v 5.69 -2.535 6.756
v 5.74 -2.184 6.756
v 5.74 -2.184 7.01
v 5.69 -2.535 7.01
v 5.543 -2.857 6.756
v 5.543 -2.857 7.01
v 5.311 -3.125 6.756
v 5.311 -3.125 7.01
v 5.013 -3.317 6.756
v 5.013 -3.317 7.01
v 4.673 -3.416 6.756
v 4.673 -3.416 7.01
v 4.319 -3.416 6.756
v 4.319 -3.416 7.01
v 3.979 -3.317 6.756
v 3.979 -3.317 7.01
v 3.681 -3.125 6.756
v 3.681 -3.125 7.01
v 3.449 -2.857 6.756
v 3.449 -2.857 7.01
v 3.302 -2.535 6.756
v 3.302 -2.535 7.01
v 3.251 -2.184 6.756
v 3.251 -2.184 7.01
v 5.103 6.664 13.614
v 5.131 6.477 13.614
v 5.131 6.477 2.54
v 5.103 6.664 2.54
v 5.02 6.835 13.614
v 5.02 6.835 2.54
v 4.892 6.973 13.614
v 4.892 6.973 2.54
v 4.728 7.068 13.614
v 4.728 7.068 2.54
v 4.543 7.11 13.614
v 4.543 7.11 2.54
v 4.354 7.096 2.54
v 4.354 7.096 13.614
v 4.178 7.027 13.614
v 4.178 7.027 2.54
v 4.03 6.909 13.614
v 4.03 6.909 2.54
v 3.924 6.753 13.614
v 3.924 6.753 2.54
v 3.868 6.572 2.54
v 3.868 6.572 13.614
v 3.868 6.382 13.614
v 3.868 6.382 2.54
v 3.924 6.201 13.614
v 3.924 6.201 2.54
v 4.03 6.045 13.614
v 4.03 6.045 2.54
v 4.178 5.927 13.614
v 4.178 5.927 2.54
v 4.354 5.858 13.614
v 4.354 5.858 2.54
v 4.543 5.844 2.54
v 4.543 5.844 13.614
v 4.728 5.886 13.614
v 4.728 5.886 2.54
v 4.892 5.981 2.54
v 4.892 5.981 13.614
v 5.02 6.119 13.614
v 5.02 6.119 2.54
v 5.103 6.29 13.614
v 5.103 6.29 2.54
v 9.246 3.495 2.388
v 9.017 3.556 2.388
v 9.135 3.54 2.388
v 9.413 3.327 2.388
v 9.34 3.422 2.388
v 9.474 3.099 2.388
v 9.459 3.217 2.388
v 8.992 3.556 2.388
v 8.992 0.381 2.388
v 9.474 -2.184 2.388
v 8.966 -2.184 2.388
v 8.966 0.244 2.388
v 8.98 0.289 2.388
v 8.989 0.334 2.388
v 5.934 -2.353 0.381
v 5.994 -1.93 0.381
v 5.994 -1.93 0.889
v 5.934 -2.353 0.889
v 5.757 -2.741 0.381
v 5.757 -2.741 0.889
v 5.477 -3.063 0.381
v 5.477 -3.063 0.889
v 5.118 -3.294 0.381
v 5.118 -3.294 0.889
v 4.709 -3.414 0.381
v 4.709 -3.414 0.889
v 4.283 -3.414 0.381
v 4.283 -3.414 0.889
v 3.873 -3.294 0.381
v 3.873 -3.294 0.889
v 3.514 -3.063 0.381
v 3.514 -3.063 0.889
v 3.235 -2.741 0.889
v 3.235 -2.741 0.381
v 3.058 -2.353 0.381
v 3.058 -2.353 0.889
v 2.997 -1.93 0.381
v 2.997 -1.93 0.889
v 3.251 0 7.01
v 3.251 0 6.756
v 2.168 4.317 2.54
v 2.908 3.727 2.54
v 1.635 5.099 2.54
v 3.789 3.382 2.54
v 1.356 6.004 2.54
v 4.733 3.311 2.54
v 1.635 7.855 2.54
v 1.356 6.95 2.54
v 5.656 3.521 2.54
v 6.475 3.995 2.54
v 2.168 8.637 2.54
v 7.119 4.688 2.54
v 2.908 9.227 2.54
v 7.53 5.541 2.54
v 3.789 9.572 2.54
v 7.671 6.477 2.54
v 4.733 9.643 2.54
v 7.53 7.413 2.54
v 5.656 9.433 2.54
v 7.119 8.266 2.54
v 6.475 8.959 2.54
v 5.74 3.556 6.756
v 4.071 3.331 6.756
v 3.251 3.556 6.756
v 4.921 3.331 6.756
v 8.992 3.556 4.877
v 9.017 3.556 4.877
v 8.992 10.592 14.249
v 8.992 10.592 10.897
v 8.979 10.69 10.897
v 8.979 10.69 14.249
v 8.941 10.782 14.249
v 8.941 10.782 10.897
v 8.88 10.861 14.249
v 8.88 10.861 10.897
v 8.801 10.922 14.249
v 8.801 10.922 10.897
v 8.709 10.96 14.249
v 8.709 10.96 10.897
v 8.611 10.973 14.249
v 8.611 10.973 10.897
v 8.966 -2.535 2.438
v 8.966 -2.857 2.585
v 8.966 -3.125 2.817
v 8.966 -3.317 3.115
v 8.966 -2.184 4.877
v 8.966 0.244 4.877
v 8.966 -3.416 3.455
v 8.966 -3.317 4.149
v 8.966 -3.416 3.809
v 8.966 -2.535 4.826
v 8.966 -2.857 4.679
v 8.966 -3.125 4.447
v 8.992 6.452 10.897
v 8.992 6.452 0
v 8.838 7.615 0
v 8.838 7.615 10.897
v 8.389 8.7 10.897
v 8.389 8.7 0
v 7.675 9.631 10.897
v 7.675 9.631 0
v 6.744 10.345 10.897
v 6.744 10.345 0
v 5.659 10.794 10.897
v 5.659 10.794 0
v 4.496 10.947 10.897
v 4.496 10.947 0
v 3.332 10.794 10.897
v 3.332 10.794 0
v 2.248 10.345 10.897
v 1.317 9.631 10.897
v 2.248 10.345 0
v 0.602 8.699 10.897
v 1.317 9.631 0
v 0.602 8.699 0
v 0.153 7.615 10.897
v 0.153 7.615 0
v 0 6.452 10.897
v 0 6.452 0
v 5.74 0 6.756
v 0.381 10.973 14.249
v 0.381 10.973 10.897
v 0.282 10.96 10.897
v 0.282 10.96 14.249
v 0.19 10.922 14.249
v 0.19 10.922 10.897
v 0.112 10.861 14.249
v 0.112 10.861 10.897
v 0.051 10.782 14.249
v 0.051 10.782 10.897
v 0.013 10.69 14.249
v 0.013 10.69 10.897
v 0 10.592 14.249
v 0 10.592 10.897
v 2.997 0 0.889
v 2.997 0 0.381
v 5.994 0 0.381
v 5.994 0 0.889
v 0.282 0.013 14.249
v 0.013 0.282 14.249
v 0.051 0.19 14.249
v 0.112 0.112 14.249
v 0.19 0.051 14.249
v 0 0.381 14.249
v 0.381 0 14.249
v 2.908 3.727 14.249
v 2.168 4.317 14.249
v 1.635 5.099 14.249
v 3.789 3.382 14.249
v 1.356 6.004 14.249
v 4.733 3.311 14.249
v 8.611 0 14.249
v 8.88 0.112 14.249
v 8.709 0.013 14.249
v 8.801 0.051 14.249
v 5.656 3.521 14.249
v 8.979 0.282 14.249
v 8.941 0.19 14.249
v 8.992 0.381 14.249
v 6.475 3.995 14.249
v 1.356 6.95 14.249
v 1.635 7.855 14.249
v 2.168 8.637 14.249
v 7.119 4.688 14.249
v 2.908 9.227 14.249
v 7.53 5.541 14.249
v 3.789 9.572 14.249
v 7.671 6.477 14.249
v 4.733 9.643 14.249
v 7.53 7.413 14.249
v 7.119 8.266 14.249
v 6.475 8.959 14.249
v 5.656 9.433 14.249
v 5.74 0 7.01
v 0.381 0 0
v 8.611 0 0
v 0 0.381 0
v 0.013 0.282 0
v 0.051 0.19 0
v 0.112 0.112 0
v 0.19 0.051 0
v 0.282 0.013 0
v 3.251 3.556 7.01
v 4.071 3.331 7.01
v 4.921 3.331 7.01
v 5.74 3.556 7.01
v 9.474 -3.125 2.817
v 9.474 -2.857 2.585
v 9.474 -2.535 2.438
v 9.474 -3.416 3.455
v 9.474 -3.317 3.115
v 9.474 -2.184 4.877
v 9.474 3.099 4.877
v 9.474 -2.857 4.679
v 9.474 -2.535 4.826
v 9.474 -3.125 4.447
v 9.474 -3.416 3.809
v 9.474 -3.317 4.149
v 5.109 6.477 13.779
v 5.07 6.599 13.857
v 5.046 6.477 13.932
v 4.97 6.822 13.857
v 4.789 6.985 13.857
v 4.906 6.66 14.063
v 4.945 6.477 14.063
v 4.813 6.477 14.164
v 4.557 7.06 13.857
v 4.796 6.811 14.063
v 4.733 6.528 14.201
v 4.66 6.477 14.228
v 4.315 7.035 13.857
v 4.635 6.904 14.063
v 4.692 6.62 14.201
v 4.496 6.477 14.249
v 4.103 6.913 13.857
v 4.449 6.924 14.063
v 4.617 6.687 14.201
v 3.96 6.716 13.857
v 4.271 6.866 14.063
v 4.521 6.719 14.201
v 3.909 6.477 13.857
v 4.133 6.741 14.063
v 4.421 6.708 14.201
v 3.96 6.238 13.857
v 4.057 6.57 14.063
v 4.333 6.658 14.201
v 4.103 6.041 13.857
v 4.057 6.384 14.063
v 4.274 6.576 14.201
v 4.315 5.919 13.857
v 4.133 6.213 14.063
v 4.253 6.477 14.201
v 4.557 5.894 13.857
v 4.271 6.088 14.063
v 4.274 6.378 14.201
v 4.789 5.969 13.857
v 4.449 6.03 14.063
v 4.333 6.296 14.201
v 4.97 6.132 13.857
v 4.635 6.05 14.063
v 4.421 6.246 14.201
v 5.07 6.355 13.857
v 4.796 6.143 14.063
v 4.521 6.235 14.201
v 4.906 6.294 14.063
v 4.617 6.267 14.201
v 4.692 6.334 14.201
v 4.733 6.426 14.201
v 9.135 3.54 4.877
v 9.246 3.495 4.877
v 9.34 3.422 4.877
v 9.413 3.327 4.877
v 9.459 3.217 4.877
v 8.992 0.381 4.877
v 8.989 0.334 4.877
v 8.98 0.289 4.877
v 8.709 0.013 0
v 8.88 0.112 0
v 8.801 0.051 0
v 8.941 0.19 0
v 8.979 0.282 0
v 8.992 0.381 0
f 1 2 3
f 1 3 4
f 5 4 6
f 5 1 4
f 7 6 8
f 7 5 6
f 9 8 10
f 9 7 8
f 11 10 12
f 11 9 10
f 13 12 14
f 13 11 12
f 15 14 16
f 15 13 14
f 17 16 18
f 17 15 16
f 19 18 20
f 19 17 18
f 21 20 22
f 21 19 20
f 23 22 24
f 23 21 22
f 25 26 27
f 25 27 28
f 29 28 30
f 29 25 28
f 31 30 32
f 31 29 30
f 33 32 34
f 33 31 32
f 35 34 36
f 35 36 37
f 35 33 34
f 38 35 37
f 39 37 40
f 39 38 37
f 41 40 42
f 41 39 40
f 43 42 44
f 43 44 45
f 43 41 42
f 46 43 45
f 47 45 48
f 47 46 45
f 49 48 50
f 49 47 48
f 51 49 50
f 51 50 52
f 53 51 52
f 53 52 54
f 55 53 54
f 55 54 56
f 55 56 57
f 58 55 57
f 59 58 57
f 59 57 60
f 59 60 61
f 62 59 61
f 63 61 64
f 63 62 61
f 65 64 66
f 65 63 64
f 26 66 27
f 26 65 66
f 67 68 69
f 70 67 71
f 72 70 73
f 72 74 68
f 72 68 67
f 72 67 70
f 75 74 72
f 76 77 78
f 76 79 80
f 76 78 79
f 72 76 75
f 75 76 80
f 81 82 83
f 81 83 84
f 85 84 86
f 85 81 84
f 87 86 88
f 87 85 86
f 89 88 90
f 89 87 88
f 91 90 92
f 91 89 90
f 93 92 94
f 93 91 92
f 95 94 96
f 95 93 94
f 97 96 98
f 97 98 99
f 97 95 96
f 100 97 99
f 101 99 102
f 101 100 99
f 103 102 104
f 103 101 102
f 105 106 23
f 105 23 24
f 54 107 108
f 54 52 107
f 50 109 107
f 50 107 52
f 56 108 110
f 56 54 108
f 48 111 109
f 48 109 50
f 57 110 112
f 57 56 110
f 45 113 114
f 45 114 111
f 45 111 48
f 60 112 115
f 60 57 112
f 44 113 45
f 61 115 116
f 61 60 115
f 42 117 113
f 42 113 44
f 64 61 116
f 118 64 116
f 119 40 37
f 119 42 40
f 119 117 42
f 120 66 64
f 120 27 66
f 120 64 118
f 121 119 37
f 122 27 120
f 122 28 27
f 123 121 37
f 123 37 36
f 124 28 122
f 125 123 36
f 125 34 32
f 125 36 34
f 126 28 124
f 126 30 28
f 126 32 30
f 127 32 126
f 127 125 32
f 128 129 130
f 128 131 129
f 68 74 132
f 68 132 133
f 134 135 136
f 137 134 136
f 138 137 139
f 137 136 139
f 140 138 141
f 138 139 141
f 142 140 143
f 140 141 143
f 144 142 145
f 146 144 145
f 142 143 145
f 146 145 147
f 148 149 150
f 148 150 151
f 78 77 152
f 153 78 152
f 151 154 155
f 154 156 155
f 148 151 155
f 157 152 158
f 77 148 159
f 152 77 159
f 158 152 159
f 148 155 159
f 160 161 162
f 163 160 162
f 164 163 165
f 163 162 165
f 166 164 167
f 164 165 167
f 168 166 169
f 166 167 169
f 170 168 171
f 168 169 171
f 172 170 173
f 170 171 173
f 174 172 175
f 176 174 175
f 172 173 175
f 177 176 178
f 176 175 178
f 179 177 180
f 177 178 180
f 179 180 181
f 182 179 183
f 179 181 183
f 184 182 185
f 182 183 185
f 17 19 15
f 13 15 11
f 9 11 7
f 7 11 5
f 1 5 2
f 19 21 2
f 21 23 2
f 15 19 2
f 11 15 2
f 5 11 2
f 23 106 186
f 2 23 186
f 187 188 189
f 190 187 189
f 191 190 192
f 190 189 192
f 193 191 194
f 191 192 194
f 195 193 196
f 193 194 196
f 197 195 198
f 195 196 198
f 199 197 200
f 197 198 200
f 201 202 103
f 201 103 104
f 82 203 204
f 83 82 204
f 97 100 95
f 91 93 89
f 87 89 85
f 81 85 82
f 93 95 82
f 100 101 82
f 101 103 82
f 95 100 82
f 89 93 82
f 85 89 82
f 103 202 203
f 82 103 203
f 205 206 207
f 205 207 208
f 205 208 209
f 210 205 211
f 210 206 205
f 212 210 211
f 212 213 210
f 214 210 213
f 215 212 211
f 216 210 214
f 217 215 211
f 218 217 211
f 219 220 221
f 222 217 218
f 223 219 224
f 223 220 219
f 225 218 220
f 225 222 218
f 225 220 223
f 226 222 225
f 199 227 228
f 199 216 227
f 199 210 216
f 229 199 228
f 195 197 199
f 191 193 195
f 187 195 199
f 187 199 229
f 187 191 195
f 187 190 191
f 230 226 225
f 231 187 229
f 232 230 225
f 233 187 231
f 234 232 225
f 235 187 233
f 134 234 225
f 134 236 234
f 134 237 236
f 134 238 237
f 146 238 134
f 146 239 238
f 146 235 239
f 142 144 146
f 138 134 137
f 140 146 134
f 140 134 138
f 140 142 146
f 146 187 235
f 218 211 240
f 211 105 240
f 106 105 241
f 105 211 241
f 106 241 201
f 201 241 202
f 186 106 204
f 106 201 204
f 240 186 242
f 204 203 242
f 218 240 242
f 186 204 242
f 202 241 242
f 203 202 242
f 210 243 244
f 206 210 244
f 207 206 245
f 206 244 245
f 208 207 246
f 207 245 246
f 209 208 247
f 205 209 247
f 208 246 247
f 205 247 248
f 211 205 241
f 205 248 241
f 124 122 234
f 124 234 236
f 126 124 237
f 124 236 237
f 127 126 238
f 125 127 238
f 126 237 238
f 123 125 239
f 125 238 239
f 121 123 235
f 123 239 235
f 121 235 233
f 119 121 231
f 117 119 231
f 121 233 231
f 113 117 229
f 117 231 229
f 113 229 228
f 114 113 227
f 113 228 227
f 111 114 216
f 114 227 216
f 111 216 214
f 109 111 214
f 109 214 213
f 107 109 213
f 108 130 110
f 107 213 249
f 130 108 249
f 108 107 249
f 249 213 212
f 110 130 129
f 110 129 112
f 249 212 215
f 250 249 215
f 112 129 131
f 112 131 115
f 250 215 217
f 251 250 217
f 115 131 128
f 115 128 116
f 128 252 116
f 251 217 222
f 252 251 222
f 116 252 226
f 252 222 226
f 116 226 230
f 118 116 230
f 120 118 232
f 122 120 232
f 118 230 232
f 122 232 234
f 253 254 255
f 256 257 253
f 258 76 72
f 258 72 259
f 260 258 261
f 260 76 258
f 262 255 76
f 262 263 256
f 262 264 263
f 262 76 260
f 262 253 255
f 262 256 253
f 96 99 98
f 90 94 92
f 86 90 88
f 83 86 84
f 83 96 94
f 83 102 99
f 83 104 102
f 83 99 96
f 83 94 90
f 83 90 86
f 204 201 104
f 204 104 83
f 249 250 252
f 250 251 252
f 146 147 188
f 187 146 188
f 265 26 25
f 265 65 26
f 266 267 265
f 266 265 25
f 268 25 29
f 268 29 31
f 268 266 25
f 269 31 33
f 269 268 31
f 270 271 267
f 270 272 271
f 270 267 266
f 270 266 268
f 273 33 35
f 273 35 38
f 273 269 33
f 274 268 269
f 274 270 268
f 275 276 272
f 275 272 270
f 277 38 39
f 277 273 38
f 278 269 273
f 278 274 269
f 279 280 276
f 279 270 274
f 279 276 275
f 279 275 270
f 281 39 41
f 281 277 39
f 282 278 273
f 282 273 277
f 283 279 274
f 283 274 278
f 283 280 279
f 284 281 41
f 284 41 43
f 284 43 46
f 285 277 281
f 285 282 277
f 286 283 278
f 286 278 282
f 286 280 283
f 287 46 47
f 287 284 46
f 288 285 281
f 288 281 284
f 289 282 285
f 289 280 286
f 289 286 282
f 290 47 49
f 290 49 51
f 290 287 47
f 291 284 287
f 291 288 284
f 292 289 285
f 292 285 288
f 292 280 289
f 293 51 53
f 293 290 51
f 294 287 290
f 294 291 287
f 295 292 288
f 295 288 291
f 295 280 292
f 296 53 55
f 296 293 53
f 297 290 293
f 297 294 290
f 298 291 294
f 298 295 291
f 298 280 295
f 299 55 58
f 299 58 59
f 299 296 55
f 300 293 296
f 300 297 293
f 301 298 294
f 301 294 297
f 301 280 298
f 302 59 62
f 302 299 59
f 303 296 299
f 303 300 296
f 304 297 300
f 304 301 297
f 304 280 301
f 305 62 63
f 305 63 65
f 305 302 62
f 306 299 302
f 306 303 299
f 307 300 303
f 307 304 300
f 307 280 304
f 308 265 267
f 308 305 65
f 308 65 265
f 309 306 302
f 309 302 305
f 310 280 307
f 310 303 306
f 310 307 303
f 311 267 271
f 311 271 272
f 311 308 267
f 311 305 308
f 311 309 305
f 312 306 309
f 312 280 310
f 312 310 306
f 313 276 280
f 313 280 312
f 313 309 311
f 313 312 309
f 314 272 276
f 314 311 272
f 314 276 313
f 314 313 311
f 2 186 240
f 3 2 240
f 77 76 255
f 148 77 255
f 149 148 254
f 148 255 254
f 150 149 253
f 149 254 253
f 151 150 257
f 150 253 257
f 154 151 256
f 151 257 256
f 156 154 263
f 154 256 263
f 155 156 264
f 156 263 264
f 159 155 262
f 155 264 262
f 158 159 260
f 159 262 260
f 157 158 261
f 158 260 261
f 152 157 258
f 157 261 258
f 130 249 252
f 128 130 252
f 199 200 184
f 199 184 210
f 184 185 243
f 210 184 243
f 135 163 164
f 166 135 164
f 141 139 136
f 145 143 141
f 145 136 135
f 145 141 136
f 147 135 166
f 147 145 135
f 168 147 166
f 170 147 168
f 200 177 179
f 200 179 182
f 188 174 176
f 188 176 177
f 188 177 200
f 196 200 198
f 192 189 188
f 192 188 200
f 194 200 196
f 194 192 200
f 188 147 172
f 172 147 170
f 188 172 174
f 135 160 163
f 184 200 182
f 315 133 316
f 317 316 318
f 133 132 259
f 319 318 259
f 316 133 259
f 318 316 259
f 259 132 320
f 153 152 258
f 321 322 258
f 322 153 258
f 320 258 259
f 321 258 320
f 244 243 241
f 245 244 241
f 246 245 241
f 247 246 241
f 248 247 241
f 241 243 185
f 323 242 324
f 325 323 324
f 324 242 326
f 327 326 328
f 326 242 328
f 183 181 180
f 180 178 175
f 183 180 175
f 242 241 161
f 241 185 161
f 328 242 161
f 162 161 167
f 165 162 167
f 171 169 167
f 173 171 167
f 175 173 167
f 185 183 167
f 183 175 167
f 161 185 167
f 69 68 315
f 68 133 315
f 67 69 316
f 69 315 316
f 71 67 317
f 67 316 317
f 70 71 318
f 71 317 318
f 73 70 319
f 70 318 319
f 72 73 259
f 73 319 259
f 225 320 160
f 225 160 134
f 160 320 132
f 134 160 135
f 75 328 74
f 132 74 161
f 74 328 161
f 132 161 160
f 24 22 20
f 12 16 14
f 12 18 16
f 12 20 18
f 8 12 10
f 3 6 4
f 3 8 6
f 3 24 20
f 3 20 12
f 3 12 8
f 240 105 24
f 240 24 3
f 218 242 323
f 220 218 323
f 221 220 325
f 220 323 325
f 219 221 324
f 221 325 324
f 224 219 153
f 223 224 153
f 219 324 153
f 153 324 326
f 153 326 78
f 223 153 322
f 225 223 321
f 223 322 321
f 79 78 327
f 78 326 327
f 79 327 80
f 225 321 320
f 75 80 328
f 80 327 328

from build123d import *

# Parameters (mm, degrees)
BASE_EXTRUDE_DEPTH       = 14.2494
SKETCH2_R                = 3.175
SKETCH2_R_2              = 0.635
CUT_EXTRUDE1_DEPTH       = 11.7094
FILLET1_R                = 0.635
CUT_EXTRUDE2_DEPTH       = 10.8966
SKETCH4_W                = 0.508
SKETCH4_H                = 2.4892
SKETCH4_W_2              = 2.9972
SKETCH4_H_2              = 0.508
SKETCH4_W_3              = 2.4892
SKETCH4_H_3              = 0.254
BOSS_EXTRUDE1_DEPTH      = 3.683
BOSS_EXTRUDE1_DEPTH_BACK = 3.556
FILLET2_R                = 0.4572
CUT_EXTRUDE3_DEPTH       = 0.508
CUT_EXTRUDE4_DEPTH       = 0.508
CUT_EXTRUDE5_DEPTH       = 0.508


with BuildPart() as part:
    # Sketch1 → Base-Extrude (new body)
    with BuildSketch(Plane.XY):
        with BuildLine():
            Line((0.381, 0), (8.6106, 0))
            ThreePointArc((8.6106, 0), (8.880007684, 0.111592316), (8.9916, 0.381))
            Line((8.9916, 0.381), (8.9916, 10.5918))
            ThreePointArc((8.9916, 10.5918), (8.880007684, 10.861207684), (8.6106, 10.9728))
            Line((8.6106, 10.9728), (0.381, 10.9728))
            ThreePointArc((0.381, 10.9728), (0.111592316, 10.861207684), (0, 10.5918))
            Line((0, 10.5918), (0, 0.381))
            ThreePointArc((0, 0.381), (0.111592316, 0.111592316), (0.381, 0))
        make_face()
    extrude(amount=BASE_EXTRUDE_DEPTH)

    # Sketch2 → Cut-Extrude1 (cut)
    with BuildSketch(Plane.XY.offset(14.2494)):
        with Locations((4.4958, 6.477)):
            Circle(SKETCH2_R)
        with Locations((4.4958, 6.477)):
            Circle(SKETCH2_R_2, mode=Mode.SUBTRACT)
    extrude(amount=-CUT_EXTRUDE1_DEPTH, mode=Mode.SUBTRACT)

    # Fillet1
    fillet1_edges = [part.edges().sort_by_distance(p)[0] for p in [
        (3.8608, 6.477, 14.2494),
    ]]
    fillet(fillet1_edges, radius=FILLET1_R)

    # Sketch3 → Cut-Extrude2 (cut)
    with BuildSketch(Plane(origin=(0, 0, 0), x_dir=(-1, 0, 0), z_dir=(0, 0, -1))):
        with BuildLine():
            Line((-0.381, 10.9728), (-8.6106, 10.9728))
            ThreePointArc((-8.6106, 10.9728), (-8.880007684, 10.861207684), (-8.9916, 10.5918))
            Line((-8.9916, 10.5918), (-8.9916, 6.4516))
            ThreePointArc((-8.9916, 6.4516), (-4.4958, 10.9474), (0, 6.4516))
            Line((0, 6.4516), (0, 10.5918))
            ThreePointArc((0, 10.5918), (-0.111592316, 10.861207684), (-0.381, 10.9728))
        make_face()
    extrude(amount=-CUT_EXTRUDE2_DEPTH, mode=Mode.SUBTRACT)

    # Sketch4 → Boss-Extrude1 (add, two sides)
    with BuildSketch(Plane.XZ) as boss_extrude1_sk:
        with Locations((9.2202, 3.6322)):
            Rectangle(SKETCH4_W, SKETCH4_H)
        with Locations((4.4958, 0.635)):
            Rectangle(SKETCH4_W_2, SKETCH4_H_2)
        with Locations((4.4958, 6.8834)):
            Rectangle(SKETCH4_W_3, SKETCH4_H_3)
    extrude(amount=BOSS_EXTRUDE1_DEPTH)
    extrude(boss_extrude1_sk.sketch, amount=-BOSS_EXTRUDE1_DEPTH_BACK)

    # Fillet2
    fillet2_edges = [part.edges().sort_by_distance(p)[0] for p in [
        (9.4742, 3.556, 3.6322),
    ]]
    fillet(fillet2_edges, radius=FILLET2_R)

    # Sketch5 → Cut-Extrude3 (cut)
    with BuildSketch(Plane(origin=(0, 0, 0.381), x_dir=(-1, 0, 0), z_dir=(0, 0, -1))):
        with BuildLine():
            Line((-2.9972, -3.683), (-5.9944, -3.683))
            Line((-5.9944, -3.683), (-5.9944, -1.9304))
            ThreePointArc((-5.9944, -1.9304), (-4.4958, -3.429), (-2.9972, -1.9304))
            Line((-2.9972, -1.9304), (-2.9972, -3.683))
        make_face()
    extrude(amount=-CUT_EXTRUDE3_DEPTH, mode=Mode.SUBTRACT)

    # Sketch6 → Cut-Extrude4 (cut)
    with BuildSketch(Plane(origin=(0.312334932, -0.354120005, 6.7564), x_dir=(-1, 0, 0), z_dir=(0, 0, -1))):
        with BuildLine():
            Line((-2.938865068, -3.328879995), (-5.428065068, -3.328879995))
            Line((-5.428065068, -3.328879995), (-5.428065068, -1.830279995))
            ThreePointArc((-5.428065068, -1.830279995), (-4.183465068, -3.074879995), (-2.938865068, -1.830279995))
            Line((-2.938865068, -1.830279995), (-2.938865068, -3.328879995))
        make_face()
    extrude(amount=-CUT_EXTRUDE4_DEPTH, mode=Mode.SUBTRACT)

    # Sketch7 → Cut-Extrude5 (cut)
    with BuildSketch(Plane(origin=(9.4742, 0, 0), x_dir=(0, 0, -1), z_dir=(1, 0, 0))):
        with BuildLine():
            Line((-2.3876, -3.683), (-2.3876, -2.1844))
            ThreePointArc((-2.3876, -2.1844), (-3.6322, -3.429), (-4.8768, -2.1844))
            Line((-4.8768, -2.1844), (-4.8768, -3.683))
            Line((-4.8768, -3.683), (-2.3876, -3.683))
        make_face()
    extrude(amount=-CUT_EXTRUDE5_DEPTH, mode=Mode.SUBTRACT)


solid = part.part
